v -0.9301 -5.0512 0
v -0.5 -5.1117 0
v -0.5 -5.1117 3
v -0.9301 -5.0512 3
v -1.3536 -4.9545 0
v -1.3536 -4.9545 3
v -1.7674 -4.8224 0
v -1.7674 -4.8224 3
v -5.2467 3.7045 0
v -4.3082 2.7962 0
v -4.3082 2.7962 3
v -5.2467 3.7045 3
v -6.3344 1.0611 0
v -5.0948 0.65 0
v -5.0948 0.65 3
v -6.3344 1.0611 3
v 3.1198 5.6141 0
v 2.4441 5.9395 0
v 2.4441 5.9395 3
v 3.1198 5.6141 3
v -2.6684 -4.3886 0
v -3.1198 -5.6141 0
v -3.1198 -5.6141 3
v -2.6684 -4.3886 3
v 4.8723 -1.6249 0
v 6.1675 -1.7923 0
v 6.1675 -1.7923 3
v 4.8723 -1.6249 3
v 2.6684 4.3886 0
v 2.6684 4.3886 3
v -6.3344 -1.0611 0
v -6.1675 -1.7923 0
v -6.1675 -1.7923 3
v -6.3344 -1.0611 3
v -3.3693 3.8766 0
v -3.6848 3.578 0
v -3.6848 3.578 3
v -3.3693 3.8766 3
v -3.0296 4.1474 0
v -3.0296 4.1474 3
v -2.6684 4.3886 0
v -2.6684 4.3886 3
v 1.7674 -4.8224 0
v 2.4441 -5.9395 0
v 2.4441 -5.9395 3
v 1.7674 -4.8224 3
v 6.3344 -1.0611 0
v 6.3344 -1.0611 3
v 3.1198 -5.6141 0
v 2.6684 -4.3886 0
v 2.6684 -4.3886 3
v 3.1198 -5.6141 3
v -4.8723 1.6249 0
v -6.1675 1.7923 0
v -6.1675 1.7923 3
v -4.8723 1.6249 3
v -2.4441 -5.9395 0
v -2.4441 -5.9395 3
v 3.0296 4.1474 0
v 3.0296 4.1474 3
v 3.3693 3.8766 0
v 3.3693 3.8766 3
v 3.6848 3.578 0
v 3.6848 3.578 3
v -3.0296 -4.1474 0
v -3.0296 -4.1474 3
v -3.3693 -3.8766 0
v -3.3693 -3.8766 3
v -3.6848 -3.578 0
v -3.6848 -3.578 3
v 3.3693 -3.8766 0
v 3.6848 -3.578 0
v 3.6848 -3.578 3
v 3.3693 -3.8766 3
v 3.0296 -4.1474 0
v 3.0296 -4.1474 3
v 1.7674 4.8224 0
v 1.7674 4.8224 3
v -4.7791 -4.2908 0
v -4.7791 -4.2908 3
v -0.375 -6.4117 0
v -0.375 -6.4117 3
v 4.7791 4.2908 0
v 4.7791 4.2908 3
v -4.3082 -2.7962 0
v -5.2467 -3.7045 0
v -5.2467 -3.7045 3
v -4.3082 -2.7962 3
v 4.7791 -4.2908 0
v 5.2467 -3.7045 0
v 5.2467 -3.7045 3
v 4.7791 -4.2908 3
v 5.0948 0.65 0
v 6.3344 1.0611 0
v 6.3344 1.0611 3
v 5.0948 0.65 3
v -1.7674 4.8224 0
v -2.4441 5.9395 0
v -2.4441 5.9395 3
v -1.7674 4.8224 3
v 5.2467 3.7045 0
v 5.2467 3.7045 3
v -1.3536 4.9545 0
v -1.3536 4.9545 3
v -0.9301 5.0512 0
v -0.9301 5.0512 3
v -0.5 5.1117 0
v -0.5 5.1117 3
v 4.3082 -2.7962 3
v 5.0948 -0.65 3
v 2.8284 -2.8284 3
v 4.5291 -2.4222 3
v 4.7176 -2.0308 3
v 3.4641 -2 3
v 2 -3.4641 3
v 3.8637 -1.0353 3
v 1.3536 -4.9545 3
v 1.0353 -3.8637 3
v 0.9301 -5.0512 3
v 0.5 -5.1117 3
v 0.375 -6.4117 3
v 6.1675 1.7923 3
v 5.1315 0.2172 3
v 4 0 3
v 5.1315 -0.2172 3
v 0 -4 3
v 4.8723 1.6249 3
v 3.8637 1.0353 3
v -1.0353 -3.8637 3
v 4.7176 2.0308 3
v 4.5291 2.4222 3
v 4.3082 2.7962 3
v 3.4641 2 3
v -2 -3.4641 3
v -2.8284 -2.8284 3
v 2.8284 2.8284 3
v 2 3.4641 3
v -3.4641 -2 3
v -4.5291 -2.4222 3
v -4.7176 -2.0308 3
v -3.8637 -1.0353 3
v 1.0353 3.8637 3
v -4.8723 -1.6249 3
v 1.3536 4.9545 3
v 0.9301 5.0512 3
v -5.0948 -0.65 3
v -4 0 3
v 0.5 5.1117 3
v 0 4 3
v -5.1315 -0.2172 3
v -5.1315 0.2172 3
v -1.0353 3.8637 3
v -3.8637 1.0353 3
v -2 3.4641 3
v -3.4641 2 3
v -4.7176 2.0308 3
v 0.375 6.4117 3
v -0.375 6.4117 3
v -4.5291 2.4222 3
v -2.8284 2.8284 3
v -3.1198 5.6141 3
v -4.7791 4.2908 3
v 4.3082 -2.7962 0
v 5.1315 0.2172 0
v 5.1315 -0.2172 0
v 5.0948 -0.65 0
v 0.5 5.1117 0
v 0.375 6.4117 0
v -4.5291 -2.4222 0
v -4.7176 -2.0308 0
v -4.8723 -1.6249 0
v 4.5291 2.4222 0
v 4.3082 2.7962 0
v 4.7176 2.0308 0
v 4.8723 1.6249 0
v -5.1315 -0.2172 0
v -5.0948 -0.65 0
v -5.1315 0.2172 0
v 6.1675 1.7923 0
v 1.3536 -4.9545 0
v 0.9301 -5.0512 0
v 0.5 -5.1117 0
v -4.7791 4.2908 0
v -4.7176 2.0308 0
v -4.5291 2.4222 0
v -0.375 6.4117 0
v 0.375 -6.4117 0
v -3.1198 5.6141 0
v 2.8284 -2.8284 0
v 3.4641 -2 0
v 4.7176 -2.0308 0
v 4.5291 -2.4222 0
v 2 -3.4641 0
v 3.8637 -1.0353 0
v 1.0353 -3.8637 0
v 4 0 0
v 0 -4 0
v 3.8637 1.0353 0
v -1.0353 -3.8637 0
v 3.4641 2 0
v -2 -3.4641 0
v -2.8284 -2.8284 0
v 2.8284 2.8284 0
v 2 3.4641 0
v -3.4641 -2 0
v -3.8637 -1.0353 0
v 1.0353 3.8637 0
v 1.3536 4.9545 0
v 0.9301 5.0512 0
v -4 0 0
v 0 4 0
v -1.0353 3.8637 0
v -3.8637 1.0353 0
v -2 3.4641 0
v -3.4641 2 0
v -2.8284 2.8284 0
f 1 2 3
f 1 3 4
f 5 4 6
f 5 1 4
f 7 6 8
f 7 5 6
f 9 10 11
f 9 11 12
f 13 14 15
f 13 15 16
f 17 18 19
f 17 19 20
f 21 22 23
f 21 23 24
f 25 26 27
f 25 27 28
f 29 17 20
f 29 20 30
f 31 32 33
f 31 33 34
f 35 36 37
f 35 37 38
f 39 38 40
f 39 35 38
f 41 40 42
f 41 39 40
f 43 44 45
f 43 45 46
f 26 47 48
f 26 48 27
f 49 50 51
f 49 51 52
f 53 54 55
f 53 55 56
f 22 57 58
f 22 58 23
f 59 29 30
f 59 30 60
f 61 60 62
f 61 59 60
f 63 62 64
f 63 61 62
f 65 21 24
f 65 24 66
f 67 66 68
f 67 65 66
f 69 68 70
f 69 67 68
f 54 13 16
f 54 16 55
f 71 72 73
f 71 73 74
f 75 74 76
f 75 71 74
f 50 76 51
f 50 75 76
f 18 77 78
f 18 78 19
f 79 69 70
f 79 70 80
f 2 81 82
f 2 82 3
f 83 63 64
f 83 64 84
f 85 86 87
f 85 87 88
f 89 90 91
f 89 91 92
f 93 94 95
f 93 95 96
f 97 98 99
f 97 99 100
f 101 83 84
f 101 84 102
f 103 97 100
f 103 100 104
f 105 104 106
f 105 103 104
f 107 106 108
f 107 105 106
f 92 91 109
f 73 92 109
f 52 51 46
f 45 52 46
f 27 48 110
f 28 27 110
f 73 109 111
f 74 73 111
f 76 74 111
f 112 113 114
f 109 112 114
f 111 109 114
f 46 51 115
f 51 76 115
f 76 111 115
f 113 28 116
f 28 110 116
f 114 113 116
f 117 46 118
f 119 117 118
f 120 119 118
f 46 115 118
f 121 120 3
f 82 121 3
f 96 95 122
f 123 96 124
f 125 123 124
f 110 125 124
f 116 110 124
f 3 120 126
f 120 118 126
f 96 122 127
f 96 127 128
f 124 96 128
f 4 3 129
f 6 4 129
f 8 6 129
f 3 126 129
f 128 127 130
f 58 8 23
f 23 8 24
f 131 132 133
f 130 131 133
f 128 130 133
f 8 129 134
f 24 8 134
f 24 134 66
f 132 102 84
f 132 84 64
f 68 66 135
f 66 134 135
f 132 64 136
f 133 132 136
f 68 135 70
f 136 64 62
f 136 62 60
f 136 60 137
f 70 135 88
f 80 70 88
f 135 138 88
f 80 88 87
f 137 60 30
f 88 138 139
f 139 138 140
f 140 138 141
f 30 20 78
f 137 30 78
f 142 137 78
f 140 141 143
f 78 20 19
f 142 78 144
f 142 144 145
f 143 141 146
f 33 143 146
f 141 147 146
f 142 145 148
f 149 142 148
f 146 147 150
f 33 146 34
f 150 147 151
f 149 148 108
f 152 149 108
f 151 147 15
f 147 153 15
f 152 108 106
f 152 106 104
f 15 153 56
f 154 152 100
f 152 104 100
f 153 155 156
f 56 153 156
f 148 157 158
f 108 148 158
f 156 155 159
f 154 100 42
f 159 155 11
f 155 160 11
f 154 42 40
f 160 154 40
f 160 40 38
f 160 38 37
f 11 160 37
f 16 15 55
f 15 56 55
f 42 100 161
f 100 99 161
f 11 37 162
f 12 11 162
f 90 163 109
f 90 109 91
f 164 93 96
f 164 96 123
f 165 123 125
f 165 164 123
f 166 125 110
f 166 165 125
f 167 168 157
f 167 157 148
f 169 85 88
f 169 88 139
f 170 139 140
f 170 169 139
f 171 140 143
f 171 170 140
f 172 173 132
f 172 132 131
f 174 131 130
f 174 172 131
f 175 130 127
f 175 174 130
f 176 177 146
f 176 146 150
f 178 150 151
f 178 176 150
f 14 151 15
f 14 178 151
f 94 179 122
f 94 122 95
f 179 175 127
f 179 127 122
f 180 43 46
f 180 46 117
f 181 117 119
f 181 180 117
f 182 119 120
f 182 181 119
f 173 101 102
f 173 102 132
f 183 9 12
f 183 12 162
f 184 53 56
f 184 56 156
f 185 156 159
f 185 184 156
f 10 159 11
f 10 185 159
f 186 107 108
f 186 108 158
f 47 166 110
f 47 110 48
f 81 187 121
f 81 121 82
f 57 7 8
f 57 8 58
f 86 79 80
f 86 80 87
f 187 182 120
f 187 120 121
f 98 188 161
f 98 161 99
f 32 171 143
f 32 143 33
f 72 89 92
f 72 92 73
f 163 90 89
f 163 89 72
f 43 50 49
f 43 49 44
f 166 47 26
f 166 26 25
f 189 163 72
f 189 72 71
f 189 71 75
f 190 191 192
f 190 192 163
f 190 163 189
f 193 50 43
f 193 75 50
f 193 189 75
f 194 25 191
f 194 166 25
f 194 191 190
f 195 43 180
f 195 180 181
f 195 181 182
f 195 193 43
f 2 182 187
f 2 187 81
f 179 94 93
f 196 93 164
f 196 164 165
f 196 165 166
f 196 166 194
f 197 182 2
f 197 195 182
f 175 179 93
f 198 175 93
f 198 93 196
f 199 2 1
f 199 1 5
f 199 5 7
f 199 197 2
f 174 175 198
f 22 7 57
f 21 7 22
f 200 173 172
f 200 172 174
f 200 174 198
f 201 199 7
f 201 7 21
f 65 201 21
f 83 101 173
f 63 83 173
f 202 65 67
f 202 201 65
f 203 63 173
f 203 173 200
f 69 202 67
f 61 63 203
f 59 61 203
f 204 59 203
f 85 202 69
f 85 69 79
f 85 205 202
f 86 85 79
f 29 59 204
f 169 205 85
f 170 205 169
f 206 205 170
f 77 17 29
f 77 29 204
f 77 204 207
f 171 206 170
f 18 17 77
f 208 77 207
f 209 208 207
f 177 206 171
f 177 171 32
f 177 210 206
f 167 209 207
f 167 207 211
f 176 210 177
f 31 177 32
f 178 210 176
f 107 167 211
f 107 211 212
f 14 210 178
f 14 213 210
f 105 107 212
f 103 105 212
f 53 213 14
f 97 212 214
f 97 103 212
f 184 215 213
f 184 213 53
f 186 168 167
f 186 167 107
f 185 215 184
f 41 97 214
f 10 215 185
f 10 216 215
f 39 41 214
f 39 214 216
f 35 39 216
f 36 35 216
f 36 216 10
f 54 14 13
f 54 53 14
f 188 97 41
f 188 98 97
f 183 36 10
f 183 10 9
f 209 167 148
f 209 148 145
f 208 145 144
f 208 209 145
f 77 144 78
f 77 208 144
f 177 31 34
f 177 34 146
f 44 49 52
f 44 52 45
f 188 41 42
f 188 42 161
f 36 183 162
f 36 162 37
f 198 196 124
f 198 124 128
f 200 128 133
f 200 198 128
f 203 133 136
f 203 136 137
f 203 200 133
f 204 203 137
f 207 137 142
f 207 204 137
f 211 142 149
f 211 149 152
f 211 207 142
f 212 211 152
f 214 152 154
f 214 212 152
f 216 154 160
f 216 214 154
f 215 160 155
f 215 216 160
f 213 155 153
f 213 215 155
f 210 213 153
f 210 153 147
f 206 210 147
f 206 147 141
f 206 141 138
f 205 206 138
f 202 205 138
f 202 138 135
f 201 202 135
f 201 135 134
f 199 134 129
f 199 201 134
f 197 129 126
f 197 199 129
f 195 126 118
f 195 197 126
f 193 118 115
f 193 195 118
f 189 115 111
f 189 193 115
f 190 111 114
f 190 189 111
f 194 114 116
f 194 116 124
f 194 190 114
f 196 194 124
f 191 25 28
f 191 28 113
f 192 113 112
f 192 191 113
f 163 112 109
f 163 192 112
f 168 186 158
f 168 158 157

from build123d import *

# Parameters (mm, degrees)
CROQUIS1_R              = 4
SALIENTE_EXTRUIR1_DEPTH = 3


with BuildPart() as part:
    # Croquis1 → Saliente-Extruir1 (new body)
    with BuildSketch(Plane.XY):
        with BuildLine():
            Line((-0.5, 5.111716619), (-0.375, 6.411716619))
            Line((-0.375, 6.411716619), (0.375, 6.411716619))
            Line((0.375, 6.411716619), (0.5, 5.111716619))
            ThreePointArc((0.5, 5.111716619), (1.142892446, 5.007338979), (1.767406286, 4.822439404))
            Line((1.767406286, 4.822439404), (2.444076255, 5.939463465))
            Line((2.444076255, 5.939463465), (3.119802906, 5.614050661))
            Line((3.119802906, 5.614050661), (2.668375154, 4.388555665))
            ThreePointArc((2.668375154, 4.388555665), (3.202313472, 4.015574083), (3.684756081, 3.578018923))
            Line((3.684756081, 3.578018923), (4.779073233, 4.29082673))
            Line((4.779073233, 4.29082673), (5.246690585, 3.704453118))
            Line((5.246690585, 3.704453118), (4.308245883, 2.79618744))
            ThreePointArc((4.308245883, 2.79618744), (4.627477041, 2.228475492), (4.872294744, 1.624927912))
            Line((4.872294744, 1.624927912), (6.167516146, 1.792339137))
            Line((6.167516146, 1.792339137), (6.334406847, 1.061143203))
            Line((6.334406847, 1.061143203), (5.094815678, 0.65))
            ThreePointArc((5.094815678, 0.65), (5.13611203, 0), (5.094815678, -0.65))
            Line((5.094815678, -0.65), (6.334406847, -1.061143203))
            Line((6.334406847, -1.061143203), (6.167516146, -1.792339137))
            Line((6.167516146, -1.792339137), (4.872294744, -1.624927912))
            ThreePointArc((4.872294744, -1.624927912), (4.627477041, -2.228475492), (4.308245883, -2.79618744))
            Line((4.308245883, -2.79618744), (5.246690585, -3.704453118))
            Line((5.246690585, -3.704453118), (4.779073233, -4.29082673))
            Line((4.779073233, -4.29082673), (3.684756081, -3.578018923))
            ThreePointArc((3.684756081, -3.578018923), (3.202313472, -4.015574083), (2.668375154, -4.388555665))
            Line((2.668375154, -4.388555665), (3.119802906, -5.614050661))
            Line((3.119802906, -5.614050661), (2.444076255, -5.939463465))
            Line((2.444076255, -5.939463465), (1.767406286, -4.822439404))
            ThreePointArc((1.767406286, -4.822439404), (1.142892446, -5.007338979), (0.5, -5.111716619))
            Line((0.5, -5.111716619), (0.375, -6.411716619))
            Line((0.375, -6.411716619), (-0.375, -6.411716619))
            Line((-0.375, -6.411716619), (-0.5, -5.111716619))
            ThreePointArc((-0.5, -5.111716619), (-1.142892446, -5.007338979), (-1.767406286, -4.822439404))
            Line((-1.767406286, -4.822439404), (-2.444076255, -5.939463465))
            Line((-2.444076255, -5.939463465), (-3.119802906, -5.614050661))
            Line((-3.119802906, -5.614050661), (-2.668375154, -4.388555665))
            ThreePointArc((-2.668375154, -4.388555665), (-3.202313472, -4.015574083), (-3.684756081, -3.578018923))
            Line((-3.684756081, -3.578018923), (-4.779073233, -4.29082673))
            Line((-4.779073233, -4.29082673), (-5.246690585, -3.704453118))
            Line((-5.246690585, -3.704453118), (-4.308245883, -2.79618744))
            ThreePointArc((-4.308245883, -2.79618744), (-4.627477041, -2.228475492), (-4.872294744, -1.624927912))
            Line((-4.872294744, -1.624927912), (-6.167516146, -1.792339137))
            Line((-6.167516146, -1.792339137), (-6.334406847, -1.061143203))
            Line((-6.334406847, -1.061143203), (-5.094815678, -0.65))
            ThreePointArc((-5.094815678, -0.65), (-5.13611203, 0), (-5.094815678, 0.65))
            Line((-5.094815678, 0.65), (-6.334406847, 1.061143203))
            Line((-6.334406847, 1.061143203), (-6.167516146, 1.792339137))
            Line((-6.167516146, 1.792339137), (-4.872294744, 1.624927912))
            ThreePointArc((-4.872294744, 1.624927912), (-4.627477041, 2.228475492), (-4.308245883, 2.79618744))
            Line((-4.308245883, 2.79618744), (-5.246690585, 3.704453118))
            Line((-5.246690585, 3.704453118), (-4.779073233, 4.29082673))
            Line((-4.779073233, 4.29082673), (-3.684756081, 3.578018923))
            ThreePointArc((-3.684756081, 3.578018923), (-3.202313472, 4.015574083), (-2.668375154, 4.388555665))
            Line((-2.668375154, 4.388555665), (-3.119802906, 5.614050661))
            Line((-3.119802906, 5.614050661), (-2.444076255, 5.939463465))
            Line((-2.444076255, 5.939463465), (-1.767406286, 4.822439404))
            ThreePointArc((-1.767406286, 4.822439404), (-1.142892446, 5.007338979), (-0.5, 5.111716619))
        make_face()
        Circle(CROQUIS1_R, mode=Mode.SUBTRACT)
    extrude(amount=SALIENTE_EXTRUIR1_DEPTH)


solid = part.part
